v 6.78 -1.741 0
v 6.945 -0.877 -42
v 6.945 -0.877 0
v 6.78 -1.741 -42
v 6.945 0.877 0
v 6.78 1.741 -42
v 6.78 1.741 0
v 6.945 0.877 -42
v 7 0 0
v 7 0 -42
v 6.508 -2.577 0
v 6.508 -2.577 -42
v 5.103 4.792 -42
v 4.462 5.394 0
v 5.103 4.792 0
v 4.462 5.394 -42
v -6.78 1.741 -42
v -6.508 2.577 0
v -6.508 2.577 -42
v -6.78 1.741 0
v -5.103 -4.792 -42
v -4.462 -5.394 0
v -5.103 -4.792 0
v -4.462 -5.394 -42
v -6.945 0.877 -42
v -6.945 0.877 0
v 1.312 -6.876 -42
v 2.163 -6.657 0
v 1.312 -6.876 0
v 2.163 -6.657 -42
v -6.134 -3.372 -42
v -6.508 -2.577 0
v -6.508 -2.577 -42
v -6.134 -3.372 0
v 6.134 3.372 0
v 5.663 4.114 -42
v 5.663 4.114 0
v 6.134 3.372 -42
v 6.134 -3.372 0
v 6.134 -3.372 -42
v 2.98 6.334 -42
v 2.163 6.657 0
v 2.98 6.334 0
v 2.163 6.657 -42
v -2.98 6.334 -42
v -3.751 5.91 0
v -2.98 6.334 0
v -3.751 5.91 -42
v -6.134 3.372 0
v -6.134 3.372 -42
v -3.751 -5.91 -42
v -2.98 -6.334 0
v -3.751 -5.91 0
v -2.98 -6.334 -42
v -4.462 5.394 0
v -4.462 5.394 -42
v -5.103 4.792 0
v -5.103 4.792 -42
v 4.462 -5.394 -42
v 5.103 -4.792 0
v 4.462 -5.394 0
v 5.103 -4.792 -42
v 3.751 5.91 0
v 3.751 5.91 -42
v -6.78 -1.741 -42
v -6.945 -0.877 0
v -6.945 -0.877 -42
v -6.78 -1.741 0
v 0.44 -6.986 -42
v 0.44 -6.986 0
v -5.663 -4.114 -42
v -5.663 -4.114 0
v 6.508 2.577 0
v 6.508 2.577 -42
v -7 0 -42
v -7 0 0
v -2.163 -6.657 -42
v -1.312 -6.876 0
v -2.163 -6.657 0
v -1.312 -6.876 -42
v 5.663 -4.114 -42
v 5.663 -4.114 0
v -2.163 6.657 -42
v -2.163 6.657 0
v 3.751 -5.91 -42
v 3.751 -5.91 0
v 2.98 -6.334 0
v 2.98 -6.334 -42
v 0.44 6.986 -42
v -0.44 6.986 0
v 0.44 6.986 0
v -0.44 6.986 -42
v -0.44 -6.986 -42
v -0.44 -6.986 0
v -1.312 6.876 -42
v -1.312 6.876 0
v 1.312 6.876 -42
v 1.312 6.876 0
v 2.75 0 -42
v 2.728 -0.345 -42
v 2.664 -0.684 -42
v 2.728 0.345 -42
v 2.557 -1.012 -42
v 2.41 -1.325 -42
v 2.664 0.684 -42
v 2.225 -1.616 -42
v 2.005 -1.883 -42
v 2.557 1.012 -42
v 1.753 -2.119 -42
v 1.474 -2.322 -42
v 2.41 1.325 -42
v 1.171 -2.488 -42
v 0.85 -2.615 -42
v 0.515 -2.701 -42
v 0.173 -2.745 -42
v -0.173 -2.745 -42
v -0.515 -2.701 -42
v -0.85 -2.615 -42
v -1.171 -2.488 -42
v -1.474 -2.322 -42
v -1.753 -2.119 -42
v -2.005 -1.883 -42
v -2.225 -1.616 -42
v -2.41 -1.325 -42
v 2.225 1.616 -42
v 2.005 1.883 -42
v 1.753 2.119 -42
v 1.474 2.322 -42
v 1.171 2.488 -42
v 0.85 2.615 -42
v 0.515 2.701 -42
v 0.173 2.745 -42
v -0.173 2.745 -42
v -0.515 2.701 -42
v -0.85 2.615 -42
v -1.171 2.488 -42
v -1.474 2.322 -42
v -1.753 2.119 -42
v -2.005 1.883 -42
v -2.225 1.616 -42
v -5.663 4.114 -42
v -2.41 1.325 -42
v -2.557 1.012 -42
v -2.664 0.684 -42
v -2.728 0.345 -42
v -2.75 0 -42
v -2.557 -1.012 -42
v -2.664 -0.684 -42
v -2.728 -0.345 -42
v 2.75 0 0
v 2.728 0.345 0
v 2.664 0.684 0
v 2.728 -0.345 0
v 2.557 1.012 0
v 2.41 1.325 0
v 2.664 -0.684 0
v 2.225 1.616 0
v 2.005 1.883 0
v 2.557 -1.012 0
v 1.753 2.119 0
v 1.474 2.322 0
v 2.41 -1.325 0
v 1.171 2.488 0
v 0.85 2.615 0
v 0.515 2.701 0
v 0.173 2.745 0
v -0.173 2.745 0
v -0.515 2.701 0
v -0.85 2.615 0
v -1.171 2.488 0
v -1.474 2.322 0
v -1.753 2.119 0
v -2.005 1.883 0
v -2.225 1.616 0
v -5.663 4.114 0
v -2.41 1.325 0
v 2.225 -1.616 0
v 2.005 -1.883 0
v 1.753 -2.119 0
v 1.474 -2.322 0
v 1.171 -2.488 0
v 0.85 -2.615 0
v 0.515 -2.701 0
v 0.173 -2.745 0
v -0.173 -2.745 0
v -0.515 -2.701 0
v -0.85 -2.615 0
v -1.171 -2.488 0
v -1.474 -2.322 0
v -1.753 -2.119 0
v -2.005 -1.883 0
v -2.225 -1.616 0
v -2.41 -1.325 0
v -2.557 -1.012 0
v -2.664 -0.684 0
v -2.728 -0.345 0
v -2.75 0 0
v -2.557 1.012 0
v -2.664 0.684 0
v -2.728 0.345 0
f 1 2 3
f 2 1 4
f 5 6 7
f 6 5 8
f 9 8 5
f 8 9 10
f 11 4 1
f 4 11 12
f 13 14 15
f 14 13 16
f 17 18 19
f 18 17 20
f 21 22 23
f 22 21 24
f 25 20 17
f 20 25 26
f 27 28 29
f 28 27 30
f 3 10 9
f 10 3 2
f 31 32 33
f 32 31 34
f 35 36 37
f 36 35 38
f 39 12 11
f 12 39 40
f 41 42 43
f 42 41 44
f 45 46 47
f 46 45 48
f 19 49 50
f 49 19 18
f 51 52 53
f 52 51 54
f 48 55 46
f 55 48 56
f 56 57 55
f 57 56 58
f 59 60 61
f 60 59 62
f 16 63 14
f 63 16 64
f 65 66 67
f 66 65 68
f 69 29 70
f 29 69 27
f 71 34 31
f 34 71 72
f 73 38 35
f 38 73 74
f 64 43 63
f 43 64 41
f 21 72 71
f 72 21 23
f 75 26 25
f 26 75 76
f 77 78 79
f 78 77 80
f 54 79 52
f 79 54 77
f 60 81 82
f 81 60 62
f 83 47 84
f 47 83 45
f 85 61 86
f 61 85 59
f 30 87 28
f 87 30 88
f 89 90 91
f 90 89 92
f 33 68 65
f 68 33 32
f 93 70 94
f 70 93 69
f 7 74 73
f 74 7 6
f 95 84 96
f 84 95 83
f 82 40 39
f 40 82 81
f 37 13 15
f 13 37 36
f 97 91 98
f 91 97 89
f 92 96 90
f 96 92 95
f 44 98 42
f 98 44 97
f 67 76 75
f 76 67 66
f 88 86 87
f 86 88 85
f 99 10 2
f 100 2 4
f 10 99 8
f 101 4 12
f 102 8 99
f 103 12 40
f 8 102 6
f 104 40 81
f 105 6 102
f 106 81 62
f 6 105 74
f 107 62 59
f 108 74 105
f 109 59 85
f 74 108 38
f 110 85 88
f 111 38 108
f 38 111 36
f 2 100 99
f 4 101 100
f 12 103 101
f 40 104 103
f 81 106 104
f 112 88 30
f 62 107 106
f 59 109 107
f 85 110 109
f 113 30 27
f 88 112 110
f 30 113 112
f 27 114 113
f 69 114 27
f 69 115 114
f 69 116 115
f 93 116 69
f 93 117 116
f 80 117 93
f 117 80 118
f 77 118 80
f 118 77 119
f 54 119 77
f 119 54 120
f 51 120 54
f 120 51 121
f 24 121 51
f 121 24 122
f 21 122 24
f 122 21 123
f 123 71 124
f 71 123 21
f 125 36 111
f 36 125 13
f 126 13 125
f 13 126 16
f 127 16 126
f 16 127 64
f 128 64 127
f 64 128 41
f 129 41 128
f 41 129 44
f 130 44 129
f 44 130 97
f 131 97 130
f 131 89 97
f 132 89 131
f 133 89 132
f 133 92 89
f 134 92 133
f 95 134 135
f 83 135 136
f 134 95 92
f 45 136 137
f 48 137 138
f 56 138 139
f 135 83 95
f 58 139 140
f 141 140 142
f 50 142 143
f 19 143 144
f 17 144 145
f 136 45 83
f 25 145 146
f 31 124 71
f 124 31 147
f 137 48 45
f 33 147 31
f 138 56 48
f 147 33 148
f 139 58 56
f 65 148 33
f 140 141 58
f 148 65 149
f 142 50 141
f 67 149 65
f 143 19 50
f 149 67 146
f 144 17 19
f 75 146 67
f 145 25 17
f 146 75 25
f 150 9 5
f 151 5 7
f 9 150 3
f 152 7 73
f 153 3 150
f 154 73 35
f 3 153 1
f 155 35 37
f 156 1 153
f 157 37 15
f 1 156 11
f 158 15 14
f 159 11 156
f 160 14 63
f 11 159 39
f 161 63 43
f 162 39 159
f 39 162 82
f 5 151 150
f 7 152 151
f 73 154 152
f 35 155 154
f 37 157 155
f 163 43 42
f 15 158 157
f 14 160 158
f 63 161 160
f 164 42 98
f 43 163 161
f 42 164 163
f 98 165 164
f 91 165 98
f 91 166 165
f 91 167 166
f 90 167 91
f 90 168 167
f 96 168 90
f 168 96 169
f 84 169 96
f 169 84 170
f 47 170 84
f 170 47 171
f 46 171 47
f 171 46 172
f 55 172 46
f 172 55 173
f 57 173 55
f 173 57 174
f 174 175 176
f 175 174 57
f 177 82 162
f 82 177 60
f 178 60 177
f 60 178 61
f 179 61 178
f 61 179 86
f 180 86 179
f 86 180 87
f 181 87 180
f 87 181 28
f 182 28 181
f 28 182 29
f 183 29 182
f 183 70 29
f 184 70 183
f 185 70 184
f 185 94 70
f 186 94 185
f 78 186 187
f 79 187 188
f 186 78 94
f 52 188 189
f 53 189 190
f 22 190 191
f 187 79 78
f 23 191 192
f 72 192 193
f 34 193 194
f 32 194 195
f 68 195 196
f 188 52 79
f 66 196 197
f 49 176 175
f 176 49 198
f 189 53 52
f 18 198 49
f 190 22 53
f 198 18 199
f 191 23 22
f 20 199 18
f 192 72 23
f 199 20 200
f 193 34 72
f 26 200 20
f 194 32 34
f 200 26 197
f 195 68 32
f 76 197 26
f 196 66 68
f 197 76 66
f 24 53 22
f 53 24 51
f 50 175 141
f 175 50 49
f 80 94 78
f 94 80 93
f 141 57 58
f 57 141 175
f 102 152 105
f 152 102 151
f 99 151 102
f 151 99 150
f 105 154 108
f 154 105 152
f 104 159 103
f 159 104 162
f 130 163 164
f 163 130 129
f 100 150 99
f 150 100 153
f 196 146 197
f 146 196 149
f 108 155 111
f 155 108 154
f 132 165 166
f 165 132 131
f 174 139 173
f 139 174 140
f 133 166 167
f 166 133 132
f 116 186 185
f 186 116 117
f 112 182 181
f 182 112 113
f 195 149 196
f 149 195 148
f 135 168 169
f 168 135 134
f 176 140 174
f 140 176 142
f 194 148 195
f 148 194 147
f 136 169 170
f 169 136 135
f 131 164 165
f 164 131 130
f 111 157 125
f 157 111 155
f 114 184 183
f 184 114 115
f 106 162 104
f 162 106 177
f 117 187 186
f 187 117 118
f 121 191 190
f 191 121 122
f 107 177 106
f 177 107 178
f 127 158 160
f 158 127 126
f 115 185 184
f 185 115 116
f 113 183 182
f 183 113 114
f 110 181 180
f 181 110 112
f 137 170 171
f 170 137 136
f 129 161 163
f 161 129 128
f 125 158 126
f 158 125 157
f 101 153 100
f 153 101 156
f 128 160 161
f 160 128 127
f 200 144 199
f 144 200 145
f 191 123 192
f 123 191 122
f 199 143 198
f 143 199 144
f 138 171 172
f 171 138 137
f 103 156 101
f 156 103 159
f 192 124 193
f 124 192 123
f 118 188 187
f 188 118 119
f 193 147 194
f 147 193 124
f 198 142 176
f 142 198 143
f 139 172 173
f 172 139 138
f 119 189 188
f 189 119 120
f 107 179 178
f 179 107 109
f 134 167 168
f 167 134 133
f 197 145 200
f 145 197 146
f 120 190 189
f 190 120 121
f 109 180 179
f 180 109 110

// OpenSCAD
$fn = 50;


difference() {
	union() {
		translate(v = [0, 0, -42.0000000000]) {
			cylinder(h = 42, r = 7.0000000000);
		}
		cylinder(h = 0, r = 17.0000000000);
	}
	union() {
		#translate(v = [0, 0, -42]) {
			cylinder(h = 42, r = 2.7500000000);
		}
	}
}
